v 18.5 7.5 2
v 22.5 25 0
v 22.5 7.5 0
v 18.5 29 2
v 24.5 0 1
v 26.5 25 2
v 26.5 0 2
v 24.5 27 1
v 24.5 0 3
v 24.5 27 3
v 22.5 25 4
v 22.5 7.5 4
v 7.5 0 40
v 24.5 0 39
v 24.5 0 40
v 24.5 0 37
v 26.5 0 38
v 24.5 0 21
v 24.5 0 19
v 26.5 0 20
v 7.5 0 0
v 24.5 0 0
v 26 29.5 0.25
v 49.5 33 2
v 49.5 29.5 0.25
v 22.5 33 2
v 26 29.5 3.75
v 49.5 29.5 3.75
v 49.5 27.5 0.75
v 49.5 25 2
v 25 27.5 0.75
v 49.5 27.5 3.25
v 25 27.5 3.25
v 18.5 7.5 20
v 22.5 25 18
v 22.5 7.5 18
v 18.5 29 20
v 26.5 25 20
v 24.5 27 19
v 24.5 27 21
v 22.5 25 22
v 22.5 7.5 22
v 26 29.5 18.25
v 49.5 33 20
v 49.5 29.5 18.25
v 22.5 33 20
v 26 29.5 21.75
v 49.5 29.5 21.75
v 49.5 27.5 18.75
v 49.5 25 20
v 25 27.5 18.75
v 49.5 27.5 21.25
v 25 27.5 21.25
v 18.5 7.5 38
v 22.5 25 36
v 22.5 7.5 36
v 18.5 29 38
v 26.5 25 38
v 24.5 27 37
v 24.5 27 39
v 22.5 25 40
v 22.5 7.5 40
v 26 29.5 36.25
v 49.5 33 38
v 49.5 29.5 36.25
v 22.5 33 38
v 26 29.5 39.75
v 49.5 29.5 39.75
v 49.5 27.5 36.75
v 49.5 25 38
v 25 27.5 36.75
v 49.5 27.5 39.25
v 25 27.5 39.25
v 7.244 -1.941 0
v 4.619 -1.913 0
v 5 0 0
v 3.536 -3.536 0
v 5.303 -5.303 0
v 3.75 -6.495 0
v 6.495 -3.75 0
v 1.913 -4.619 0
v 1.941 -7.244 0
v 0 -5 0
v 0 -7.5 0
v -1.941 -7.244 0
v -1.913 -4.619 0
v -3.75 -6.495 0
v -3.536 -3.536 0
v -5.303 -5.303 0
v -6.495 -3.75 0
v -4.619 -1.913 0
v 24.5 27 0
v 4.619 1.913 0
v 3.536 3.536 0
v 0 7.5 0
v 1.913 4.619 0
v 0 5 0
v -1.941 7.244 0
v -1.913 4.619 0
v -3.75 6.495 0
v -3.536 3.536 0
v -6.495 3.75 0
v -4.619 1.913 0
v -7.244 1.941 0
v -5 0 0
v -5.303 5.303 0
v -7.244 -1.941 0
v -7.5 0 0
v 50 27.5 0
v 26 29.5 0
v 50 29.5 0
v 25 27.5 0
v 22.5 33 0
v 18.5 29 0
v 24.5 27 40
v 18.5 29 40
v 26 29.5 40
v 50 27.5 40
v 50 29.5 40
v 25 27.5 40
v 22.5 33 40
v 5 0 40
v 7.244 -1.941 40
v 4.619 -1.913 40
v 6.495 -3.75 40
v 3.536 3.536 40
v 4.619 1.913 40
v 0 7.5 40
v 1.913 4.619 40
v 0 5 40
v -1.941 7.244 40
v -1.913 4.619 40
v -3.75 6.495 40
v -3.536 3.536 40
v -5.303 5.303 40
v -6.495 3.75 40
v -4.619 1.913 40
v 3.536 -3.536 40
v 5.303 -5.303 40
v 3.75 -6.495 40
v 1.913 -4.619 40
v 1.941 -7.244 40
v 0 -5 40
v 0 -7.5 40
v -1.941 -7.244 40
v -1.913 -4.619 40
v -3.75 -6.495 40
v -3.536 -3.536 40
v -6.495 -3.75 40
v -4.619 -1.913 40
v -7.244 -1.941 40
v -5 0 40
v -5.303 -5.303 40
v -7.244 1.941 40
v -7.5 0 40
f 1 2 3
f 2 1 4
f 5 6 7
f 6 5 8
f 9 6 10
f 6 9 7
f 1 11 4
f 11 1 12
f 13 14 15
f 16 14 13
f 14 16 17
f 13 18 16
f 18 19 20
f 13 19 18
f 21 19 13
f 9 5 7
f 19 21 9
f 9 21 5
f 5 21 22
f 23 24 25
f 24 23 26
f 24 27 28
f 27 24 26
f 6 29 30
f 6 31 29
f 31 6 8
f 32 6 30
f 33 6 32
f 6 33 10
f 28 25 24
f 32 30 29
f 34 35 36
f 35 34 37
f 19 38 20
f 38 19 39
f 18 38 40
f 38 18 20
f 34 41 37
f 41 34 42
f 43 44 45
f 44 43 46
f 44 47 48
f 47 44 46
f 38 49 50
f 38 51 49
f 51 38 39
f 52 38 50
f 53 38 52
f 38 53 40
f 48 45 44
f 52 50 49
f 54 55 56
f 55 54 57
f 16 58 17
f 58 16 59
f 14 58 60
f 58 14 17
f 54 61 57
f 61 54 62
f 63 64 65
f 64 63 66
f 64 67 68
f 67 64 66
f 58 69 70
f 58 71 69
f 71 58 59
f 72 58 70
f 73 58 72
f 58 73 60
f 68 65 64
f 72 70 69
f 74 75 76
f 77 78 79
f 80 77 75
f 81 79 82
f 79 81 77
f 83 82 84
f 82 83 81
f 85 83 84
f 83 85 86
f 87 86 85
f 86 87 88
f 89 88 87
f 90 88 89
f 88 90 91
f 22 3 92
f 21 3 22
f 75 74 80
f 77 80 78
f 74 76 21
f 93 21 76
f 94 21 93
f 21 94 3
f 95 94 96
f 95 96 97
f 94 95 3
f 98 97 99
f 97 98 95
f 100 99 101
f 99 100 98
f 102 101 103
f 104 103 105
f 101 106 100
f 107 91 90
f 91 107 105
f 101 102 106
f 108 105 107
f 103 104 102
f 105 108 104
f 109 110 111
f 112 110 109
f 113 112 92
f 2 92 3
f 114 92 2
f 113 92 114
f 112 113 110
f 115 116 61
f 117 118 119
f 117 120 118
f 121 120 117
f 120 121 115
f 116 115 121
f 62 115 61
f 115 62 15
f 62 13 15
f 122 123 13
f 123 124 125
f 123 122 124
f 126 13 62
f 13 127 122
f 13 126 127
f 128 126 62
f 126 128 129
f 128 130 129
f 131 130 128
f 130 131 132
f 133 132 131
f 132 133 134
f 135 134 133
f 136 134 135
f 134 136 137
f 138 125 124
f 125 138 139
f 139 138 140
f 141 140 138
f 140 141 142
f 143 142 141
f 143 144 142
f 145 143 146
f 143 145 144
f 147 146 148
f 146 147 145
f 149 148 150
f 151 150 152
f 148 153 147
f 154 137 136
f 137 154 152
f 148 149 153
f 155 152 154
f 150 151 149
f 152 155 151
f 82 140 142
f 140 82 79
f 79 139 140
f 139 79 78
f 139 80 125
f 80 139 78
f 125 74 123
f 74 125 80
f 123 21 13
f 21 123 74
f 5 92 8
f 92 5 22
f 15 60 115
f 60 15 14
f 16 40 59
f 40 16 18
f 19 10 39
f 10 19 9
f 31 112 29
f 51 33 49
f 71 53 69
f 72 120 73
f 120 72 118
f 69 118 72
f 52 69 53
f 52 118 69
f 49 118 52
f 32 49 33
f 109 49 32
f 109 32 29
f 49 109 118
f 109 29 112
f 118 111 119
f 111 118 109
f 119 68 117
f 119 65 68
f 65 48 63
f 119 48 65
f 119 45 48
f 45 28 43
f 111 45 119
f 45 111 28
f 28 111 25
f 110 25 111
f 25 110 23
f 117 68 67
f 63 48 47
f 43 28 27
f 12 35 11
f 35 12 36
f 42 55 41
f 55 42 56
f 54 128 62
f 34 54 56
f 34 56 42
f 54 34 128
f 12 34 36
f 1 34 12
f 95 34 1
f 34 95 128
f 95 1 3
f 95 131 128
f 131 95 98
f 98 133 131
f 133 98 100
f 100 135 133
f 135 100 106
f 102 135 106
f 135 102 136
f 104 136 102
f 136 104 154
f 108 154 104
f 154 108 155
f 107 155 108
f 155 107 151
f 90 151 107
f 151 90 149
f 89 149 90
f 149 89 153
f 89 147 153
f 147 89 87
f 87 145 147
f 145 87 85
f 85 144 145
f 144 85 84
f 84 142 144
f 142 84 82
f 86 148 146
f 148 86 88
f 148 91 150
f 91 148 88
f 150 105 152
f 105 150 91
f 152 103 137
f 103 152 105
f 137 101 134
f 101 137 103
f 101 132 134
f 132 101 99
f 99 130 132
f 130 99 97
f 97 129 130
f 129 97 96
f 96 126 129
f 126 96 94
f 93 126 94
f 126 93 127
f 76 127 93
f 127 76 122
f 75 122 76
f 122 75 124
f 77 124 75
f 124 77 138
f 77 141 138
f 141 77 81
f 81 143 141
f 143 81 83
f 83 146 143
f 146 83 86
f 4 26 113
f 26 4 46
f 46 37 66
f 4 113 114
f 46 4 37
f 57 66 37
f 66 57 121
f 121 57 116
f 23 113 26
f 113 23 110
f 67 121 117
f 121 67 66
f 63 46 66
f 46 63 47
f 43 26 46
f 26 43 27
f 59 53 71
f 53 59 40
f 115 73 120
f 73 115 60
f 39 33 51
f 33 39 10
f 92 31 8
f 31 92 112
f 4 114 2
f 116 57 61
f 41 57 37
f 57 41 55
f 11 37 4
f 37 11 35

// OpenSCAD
//Author Jasper den Ouden 24-10-2013
// Placed in public domain

//Think to help clamp a electrical drill into a vice.

h=50;

dy=50;
dx=35;
dr=15;

t=2;

module boormachine_houder()
{
    difference()
    {   linear_extrude(height=h) difference()
        {   square([dx+t,dy],center=true);
            minkowski()
            {   square([dx-2*dr,dy-2*dr+t/2],center=true);
                circle(dr);
            }
            difference()
            {   square([dx,dy-t],center=true);
                minkowski()
                {   square([dx-2*dr,dy-2*dr+t/2],center=true);
                    circle(dr+t/2);
                }            
            }
            square([dx-dr,2*dy],center=true);
        }
    }
    linear_extrude(height=t) difference()
    {   square([dx+t,dy],center=true);
        minkowski()
        {   square([dx-2*dr,dy-2*dr+t/2],center=true);
            circle(dr);
        }
        square([dx-dr,2*dy],center=true);
    }
    
    translate([0,(dy+t)/2]) linear_extrude(height=4*t) difference()
    {   circle(dx/2);
        circle(dx/2-t);
        translate([0,-dx/2-dr/4]) square([dx,dx],center=true);
    }
}

*intersection()
{   boormachine_houder();
//    translate([dx/2-2*t,0]) cube([dy,dy,2*h/3]);
}


h2=15;
l2=40;
t2=4;


module ridge(t2=t2)
{
    translate([1.5*h2,0]) rotate([-90,0,0]) scale([2,1,1]) cylinder(r=t2/2,h=dx-t2-t,$fn=4);
    translate([1.5*h2,dx-t2-t]) rotate([0,90,0]) scale([1,2,1]) cylinder(r=t2/2,h=dx-2*t2,$fn=4);
}

module pushdown()
{   a=50;
    difference()
    {   linear_extrude(height=l2) difference()
        {   union()
            {   circle(h2/2);
                square([1.5*h2,h2/2]);
                translate([1.5*h2,0]) square([dx-h2/2,dx-h2/2+t]);
            }
            circle(h2/3);
            translate([1.5*h2+t,-h2/2]) square([dx,dx]);
        }
    }
    for(z=[t2/2,l2/2,l2-t2/2]) translate([0,0,z]) ridge();
    translate([1.5*h2,dx-t2-t]) cylinder(r=t2,h=l2, $fn=4);
//    translate([1.5*h2+t-t2,0]) rotate([a,0,0]) cube([t2,(dx)/sin(a),t2]);
}

pushdown();
